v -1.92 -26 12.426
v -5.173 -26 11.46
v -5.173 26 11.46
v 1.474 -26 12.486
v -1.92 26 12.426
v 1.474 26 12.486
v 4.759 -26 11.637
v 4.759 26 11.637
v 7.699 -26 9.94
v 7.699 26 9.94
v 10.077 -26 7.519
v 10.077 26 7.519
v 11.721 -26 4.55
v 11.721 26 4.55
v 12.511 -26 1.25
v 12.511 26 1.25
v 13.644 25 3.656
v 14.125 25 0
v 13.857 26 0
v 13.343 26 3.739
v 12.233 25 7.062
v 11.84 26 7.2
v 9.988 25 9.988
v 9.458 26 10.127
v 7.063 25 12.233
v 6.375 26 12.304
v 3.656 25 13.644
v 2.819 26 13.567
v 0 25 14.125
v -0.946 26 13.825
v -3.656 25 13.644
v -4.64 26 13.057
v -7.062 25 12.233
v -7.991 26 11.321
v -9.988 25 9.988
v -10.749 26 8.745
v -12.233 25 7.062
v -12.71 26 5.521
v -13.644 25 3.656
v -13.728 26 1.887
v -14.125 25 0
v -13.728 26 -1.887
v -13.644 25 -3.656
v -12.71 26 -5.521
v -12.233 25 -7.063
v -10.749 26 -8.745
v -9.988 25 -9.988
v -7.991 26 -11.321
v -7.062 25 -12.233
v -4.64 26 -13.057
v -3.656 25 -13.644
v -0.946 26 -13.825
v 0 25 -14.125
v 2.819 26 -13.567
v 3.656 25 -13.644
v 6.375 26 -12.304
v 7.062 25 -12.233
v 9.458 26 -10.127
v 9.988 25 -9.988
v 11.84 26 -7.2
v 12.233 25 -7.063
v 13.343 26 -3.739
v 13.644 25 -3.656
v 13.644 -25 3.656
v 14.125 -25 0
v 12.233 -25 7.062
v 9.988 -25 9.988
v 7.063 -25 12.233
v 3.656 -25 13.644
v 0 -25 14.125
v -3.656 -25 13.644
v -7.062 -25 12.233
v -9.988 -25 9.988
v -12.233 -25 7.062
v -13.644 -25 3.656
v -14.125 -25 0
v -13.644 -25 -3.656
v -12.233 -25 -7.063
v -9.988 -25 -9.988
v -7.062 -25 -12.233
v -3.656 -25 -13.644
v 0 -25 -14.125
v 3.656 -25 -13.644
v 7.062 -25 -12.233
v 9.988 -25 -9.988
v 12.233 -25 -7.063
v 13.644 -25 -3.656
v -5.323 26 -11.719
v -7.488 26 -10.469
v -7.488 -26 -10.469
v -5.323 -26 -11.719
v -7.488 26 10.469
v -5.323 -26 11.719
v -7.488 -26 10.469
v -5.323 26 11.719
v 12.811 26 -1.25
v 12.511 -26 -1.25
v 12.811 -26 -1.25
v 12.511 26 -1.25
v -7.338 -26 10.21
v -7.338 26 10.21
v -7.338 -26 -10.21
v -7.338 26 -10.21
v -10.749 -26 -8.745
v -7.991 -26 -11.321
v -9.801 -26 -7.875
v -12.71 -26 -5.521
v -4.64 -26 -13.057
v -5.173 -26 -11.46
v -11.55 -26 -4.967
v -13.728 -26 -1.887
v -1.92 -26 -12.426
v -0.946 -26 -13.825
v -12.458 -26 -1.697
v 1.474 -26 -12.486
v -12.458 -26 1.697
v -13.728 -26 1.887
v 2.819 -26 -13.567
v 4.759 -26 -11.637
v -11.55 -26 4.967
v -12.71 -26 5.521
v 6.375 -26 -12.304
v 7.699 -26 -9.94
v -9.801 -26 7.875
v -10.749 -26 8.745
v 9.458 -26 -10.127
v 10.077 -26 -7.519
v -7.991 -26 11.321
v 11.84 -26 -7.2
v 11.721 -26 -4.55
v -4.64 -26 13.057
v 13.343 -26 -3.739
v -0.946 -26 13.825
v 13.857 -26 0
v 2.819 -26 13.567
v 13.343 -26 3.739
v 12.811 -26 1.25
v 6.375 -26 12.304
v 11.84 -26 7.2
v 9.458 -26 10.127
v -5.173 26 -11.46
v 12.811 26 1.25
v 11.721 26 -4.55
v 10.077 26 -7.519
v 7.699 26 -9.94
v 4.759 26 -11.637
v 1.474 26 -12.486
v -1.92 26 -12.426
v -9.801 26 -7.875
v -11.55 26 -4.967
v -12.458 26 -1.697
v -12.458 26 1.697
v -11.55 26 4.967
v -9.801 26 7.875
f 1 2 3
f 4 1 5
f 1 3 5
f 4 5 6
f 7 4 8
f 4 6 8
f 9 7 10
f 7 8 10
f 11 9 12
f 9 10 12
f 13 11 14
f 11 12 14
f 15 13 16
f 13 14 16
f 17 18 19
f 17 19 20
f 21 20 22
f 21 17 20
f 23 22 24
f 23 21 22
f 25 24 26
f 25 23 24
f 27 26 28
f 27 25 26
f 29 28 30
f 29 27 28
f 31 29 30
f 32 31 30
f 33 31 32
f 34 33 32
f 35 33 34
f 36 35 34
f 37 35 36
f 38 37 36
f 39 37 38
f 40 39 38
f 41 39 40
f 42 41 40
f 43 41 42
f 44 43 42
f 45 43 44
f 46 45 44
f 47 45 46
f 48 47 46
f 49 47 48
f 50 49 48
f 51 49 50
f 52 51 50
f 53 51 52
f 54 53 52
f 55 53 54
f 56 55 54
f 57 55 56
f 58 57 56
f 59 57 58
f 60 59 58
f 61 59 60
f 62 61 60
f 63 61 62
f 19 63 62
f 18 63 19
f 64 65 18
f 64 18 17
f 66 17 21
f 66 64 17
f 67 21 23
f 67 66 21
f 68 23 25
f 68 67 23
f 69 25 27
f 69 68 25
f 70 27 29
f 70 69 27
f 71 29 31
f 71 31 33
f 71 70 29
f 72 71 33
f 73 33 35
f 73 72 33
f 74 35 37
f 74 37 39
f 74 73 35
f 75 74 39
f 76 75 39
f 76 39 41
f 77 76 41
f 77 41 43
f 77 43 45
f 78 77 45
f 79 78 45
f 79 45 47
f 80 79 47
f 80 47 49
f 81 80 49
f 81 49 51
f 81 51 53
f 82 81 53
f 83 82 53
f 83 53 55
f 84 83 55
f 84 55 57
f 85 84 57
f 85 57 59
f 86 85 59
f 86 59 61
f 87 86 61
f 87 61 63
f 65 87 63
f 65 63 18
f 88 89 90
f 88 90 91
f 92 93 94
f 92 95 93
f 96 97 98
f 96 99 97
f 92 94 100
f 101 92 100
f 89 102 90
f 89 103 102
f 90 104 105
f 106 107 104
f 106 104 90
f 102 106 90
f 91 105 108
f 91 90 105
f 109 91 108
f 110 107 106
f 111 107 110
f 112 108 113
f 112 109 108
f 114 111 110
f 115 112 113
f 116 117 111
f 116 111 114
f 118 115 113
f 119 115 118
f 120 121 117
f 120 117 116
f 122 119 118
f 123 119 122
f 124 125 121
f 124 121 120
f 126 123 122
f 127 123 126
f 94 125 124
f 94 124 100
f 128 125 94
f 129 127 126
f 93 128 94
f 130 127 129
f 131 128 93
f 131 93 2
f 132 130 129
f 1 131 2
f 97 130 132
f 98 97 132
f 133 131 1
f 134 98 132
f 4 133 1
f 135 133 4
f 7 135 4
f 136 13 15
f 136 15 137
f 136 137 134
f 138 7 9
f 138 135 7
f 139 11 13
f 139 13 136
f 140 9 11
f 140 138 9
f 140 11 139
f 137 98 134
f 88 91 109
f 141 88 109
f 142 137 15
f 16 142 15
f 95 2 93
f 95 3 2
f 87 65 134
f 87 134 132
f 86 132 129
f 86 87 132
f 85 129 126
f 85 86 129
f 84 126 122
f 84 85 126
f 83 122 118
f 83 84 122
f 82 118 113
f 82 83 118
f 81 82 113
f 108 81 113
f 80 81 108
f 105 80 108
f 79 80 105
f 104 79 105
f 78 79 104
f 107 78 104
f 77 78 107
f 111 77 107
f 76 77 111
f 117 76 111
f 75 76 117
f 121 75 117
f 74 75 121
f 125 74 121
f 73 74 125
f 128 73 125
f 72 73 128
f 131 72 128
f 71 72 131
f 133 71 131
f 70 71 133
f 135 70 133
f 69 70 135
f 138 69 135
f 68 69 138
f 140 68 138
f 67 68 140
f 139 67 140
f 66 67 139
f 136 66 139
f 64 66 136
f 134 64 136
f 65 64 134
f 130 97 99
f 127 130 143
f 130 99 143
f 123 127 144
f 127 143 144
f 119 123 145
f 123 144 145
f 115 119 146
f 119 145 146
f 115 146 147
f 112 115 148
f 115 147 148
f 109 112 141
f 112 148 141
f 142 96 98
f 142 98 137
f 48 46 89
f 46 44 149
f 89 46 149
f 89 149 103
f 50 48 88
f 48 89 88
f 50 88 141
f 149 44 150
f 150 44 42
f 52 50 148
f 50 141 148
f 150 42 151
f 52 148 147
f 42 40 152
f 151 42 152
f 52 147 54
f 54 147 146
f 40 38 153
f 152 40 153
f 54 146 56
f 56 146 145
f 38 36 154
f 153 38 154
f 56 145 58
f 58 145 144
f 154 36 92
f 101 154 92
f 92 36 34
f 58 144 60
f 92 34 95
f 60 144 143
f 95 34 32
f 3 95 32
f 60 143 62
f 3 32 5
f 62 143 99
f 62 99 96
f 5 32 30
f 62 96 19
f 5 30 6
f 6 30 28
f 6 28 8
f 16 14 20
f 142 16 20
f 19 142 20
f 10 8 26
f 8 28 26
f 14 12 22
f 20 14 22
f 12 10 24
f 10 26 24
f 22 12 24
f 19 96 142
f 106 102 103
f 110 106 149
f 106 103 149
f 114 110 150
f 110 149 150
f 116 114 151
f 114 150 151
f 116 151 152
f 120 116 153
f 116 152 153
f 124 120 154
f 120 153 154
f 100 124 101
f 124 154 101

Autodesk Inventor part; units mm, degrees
ref_plane "YZ Plane" through (0, 0, 0) normal (1, 0, 0) x (0, 1, 0)
ref_plane "XZ Plane" through (0, 0, 0) normal (0, 1, 0) x (-1, 0, 0)
ref_plane "XY Plane" through (0, 0, 0) normal (0, 0, 1) x (1, 0, 0)
sketch "Эскиз1" plane through (0, 0, 0) normal (0, 0, 1) x (1, 0, 0)
  line L0 (0, 26) -> (0, -26)
  line L1 (12.573, 26) -> (13.8571, 26)
  line L2 (14.125, 25) -> (14.125, -25)
  line L3 (13.8571, -26) -> (12.573, -26)
  line L4 (12.573, -26) -> (12.573, 26)
  line L5 (14.125, 25) -> (13.8571, 26)
  line L6 (14.125, -25) -> (13.8571, -26)
  point P0 (0, 0)
  point P1 (0, 0)
  point P2 (14.125, -26)
  point P3 (14.125, 26)
  dimension "d0" = 52
  dimension "d1" = 28.25
  dimension "d2" = 25.146
  dimension "d3" = 1
  dimension "d4" = 15
  dimension "d5" = 1
  dimension "d6" = 15
revolve "Вращение1" add sketch "Эскиз1" angle 360 about axis through (0, 26, 0) along (0, -1, 0)
sketch "Эскиз2" plane through (0, 26, 0) normal (0, 1, 0) x (1, 0, 0)
  line L0 (12.5107, 1.25) -> (12.8107, 1.25)
  line L1 (12.8107, 1.25) -> (12.8107, -1.25)
  line L2 (12.8107, -1.25) -> (12.5107, -1.25)
  line L3 (12.5107, -1.25) -> (12.5107, 1.25)
  circle A0 centre (0, 0) radius 12.573 projected
  point P0 (0, 0)
  point P1 (12.5107, 0)
  dimension "d8" = 2.5
  dimension "d10" = 0.3
extrude "Выдавливание1" cut sketch "Эскиз2" against normal through all contours A0 L3 | L0 L1 L2 A0 picked at (12.5222, -0.278)
pattern_circular "Круговой массив1" count 3 over 360 about axis through (0, 0, 0) along (0, -1, 0) of "Выдавливание1"
equation "\"d5\" = d3"
equation "\"d6\" = d4"
properties part number "75. Втулка блока заднего хода"
